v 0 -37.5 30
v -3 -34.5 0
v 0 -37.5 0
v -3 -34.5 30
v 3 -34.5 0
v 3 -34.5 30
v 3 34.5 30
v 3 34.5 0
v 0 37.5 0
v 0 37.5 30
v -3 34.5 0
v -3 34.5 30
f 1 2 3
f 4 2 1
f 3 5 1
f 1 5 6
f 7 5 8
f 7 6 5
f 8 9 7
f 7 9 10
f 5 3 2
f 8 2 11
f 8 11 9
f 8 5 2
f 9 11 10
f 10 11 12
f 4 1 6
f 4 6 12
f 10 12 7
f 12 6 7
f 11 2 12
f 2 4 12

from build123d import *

# Parameters (mm, degrees)
F0_W     = 75
F0_H     = 30
F1_DEPTH = 3
F2_SIZE  = 2.99999


# Not quite as in the source:
# - a fillet or chamfer is up to 0.001 mm smaller than in the source, because OpenCascade refuses the exact size


with BuildPart() as f1:
    # F0 (on Right) → F1 (new body, symmetric)
    with BuildSketch(Plane.YZ):
        with Locations((0, 15)):
            Rectangle(F0_W, F0_H)
    extrude(amount=F1_DEPTH, both=True)

    # F2 (size 3 in the source; OpenCascade refuses exactly that, so slightly less here)
    f2_edges = [f1.edges().sort_by_distance(p)[0] for p in [
        (3, -37.5, 15),
        (-3, -37.5, 15),
        (-3, 37.5, 15),
        (3, 37.5, 15),
    ]]
    chamfer(f2_edges, length=F2_SIZE)


solid = f1.part
